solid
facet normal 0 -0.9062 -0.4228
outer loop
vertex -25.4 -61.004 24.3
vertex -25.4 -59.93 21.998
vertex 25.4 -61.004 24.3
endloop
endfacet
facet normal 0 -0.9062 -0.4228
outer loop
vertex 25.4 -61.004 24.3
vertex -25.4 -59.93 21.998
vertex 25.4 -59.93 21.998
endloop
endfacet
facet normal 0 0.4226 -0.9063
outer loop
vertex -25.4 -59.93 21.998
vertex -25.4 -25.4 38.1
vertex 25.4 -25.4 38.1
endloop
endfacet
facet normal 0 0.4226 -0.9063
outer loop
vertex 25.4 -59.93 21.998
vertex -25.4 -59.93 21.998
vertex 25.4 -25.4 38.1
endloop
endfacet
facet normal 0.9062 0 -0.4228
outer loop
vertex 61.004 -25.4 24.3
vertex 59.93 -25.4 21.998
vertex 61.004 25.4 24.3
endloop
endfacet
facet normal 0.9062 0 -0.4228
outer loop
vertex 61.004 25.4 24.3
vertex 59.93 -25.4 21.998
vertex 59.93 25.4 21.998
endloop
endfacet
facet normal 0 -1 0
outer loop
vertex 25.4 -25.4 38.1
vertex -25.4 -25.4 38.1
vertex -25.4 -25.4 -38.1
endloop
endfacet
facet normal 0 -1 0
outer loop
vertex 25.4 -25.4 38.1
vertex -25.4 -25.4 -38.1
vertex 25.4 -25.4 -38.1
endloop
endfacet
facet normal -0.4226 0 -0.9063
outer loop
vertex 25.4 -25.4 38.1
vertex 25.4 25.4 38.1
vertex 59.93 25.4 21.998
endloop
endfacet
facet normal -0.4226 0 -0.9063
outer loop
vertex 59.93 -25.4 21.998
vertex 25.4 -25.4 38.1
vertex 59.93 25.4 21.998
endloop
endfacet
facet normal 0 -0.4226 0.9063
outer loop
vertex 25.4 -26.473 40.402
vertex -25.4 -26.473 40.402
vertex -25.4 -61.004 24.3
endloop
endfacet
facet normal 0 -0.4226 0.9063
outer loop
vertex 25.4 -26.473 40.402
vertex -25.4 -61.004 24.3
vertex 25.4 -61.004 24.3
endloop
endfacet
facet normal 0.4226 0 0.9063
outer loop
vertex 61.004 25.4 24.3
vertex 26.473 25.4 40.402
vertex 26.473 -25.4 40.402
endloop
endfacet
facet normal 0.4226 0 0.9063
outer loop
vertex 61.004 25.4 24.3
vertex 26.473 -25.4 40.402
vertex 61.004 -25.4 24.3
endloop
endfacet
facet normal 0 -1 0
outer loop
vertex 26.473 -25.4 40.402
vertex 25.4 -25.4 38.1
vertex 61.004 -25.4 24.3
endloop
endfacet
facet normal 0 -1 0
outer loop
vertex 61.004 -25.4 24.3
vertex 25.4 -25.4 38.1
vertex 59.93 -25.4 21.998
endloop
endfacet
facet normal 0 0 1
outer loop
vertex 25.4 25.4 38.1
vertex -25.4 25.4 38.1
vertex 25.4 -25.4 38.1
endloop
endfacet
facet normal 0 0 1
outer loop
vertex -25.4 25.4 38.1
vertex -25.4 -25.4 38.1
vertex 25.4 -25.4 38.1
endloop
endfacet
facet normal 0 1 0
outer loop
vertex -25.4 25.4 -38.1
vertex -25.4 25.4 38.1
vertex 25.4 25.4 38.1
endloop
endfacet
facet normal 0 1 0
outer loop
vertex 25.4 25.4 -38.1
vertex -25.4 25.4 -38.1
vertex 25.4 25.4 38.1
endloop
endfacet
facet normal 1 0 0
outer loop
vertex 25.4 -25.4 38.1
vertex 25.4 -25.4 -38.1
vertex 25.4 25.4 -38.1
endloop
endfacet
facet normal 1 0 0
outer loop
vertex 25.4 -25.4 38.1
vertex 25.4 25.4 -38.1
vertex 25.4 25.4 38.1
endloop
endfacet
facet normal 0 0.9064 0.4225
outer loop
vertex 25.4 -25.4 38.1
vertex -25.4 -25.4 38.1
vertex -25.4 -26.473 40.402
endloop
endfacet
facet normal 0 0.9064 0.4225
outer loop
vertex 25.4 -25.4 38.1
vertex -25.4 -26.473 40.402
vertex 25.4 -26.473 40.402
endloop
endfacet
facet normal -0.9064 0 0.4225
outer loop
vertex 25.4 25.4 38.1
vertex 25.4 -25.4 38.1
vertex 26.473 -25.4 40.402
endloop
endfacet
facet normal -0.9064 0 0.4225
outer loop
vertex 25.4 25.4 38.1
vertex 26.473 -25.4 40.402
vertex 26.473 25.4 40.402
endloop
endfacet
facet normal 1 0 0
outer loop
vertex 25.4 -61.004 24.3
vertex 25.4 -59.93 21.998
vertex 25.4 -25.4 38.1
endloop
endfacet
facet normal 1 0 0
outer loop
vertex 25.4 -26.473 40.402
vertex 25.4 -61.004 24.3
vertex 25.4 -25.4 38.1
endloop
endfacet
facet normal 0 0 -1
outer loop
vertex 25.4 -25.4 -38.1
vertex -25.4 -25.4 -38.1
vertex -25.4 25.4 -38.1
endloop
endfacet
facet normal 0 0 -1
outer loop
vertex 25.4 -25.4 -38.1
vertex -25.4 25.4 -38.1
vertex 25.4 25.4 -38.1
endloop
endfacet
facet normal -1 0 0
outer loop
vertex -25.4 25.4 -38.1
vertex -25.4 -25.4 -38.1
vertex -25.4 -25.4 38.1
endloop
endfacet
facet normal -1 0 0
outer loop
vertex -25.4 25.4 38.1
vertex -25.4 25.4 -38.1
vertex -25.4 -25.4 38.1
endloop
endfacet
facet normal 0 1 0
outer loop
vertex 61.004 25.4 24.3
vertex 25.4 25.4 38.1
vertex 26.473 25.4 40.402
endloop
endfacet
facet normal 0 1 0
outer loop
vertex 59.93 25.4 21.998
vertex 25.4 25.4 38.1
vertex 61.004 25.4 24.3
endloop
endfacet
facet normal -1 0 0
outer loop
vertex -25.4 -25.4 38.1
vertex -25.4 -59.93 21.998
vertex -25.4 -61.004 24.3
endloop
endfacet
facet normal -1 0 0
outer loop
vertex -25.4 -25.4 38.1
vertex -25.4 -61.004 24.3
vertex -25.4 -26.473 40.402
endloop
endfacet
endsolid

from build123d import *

# Parameters (mm, degrees)
F0_W     = 50.8
F0_H     = 76.2
F1_DEPTH = 25.4
F4_W     = 50.8
F4_H     = 38.1
F5_DEPTH = 2.54
F6_W     = 38.1
F6_H     = 50.8
F7_DEPTH = 2.54


with BuildPart() as f1:
    # F0 (on Front) → F1 (new body, symmetric)
    with BuildSketch(Plane.XZ):
        Rectangle(F0_W, F0_H)
    extrude(amount=F1_DEPTH, both=True)

    # F4 (on face) → F5 (join)
    with BuildSketch(Plane(origin=(0, -19.129744, 41.023868), x_dir=(1, 0, 0), z_dir=(0, -0.422618, 0.906308))):
        with Locations((0, -25.968462)):
            Rectangle(F4_W, F4_H)
    extrude(amount=F5_DEPTH)


with BuildPart() as f7:
    # F6 (on face) → F7 (new body)
    with BuildSketch(Plane(origin=(19.129744, 0, 41.023868), x_dir=(0.906308, 0, -0.422618), z_dir=(0.422618, 0, 0.906308))):
        with Locations((25.968462, 0)):
            Rectangle(F6_W, F6_H)
    extrude(amount=F7_DEPTH)


solid = Compound([f1.part, f7.part])
